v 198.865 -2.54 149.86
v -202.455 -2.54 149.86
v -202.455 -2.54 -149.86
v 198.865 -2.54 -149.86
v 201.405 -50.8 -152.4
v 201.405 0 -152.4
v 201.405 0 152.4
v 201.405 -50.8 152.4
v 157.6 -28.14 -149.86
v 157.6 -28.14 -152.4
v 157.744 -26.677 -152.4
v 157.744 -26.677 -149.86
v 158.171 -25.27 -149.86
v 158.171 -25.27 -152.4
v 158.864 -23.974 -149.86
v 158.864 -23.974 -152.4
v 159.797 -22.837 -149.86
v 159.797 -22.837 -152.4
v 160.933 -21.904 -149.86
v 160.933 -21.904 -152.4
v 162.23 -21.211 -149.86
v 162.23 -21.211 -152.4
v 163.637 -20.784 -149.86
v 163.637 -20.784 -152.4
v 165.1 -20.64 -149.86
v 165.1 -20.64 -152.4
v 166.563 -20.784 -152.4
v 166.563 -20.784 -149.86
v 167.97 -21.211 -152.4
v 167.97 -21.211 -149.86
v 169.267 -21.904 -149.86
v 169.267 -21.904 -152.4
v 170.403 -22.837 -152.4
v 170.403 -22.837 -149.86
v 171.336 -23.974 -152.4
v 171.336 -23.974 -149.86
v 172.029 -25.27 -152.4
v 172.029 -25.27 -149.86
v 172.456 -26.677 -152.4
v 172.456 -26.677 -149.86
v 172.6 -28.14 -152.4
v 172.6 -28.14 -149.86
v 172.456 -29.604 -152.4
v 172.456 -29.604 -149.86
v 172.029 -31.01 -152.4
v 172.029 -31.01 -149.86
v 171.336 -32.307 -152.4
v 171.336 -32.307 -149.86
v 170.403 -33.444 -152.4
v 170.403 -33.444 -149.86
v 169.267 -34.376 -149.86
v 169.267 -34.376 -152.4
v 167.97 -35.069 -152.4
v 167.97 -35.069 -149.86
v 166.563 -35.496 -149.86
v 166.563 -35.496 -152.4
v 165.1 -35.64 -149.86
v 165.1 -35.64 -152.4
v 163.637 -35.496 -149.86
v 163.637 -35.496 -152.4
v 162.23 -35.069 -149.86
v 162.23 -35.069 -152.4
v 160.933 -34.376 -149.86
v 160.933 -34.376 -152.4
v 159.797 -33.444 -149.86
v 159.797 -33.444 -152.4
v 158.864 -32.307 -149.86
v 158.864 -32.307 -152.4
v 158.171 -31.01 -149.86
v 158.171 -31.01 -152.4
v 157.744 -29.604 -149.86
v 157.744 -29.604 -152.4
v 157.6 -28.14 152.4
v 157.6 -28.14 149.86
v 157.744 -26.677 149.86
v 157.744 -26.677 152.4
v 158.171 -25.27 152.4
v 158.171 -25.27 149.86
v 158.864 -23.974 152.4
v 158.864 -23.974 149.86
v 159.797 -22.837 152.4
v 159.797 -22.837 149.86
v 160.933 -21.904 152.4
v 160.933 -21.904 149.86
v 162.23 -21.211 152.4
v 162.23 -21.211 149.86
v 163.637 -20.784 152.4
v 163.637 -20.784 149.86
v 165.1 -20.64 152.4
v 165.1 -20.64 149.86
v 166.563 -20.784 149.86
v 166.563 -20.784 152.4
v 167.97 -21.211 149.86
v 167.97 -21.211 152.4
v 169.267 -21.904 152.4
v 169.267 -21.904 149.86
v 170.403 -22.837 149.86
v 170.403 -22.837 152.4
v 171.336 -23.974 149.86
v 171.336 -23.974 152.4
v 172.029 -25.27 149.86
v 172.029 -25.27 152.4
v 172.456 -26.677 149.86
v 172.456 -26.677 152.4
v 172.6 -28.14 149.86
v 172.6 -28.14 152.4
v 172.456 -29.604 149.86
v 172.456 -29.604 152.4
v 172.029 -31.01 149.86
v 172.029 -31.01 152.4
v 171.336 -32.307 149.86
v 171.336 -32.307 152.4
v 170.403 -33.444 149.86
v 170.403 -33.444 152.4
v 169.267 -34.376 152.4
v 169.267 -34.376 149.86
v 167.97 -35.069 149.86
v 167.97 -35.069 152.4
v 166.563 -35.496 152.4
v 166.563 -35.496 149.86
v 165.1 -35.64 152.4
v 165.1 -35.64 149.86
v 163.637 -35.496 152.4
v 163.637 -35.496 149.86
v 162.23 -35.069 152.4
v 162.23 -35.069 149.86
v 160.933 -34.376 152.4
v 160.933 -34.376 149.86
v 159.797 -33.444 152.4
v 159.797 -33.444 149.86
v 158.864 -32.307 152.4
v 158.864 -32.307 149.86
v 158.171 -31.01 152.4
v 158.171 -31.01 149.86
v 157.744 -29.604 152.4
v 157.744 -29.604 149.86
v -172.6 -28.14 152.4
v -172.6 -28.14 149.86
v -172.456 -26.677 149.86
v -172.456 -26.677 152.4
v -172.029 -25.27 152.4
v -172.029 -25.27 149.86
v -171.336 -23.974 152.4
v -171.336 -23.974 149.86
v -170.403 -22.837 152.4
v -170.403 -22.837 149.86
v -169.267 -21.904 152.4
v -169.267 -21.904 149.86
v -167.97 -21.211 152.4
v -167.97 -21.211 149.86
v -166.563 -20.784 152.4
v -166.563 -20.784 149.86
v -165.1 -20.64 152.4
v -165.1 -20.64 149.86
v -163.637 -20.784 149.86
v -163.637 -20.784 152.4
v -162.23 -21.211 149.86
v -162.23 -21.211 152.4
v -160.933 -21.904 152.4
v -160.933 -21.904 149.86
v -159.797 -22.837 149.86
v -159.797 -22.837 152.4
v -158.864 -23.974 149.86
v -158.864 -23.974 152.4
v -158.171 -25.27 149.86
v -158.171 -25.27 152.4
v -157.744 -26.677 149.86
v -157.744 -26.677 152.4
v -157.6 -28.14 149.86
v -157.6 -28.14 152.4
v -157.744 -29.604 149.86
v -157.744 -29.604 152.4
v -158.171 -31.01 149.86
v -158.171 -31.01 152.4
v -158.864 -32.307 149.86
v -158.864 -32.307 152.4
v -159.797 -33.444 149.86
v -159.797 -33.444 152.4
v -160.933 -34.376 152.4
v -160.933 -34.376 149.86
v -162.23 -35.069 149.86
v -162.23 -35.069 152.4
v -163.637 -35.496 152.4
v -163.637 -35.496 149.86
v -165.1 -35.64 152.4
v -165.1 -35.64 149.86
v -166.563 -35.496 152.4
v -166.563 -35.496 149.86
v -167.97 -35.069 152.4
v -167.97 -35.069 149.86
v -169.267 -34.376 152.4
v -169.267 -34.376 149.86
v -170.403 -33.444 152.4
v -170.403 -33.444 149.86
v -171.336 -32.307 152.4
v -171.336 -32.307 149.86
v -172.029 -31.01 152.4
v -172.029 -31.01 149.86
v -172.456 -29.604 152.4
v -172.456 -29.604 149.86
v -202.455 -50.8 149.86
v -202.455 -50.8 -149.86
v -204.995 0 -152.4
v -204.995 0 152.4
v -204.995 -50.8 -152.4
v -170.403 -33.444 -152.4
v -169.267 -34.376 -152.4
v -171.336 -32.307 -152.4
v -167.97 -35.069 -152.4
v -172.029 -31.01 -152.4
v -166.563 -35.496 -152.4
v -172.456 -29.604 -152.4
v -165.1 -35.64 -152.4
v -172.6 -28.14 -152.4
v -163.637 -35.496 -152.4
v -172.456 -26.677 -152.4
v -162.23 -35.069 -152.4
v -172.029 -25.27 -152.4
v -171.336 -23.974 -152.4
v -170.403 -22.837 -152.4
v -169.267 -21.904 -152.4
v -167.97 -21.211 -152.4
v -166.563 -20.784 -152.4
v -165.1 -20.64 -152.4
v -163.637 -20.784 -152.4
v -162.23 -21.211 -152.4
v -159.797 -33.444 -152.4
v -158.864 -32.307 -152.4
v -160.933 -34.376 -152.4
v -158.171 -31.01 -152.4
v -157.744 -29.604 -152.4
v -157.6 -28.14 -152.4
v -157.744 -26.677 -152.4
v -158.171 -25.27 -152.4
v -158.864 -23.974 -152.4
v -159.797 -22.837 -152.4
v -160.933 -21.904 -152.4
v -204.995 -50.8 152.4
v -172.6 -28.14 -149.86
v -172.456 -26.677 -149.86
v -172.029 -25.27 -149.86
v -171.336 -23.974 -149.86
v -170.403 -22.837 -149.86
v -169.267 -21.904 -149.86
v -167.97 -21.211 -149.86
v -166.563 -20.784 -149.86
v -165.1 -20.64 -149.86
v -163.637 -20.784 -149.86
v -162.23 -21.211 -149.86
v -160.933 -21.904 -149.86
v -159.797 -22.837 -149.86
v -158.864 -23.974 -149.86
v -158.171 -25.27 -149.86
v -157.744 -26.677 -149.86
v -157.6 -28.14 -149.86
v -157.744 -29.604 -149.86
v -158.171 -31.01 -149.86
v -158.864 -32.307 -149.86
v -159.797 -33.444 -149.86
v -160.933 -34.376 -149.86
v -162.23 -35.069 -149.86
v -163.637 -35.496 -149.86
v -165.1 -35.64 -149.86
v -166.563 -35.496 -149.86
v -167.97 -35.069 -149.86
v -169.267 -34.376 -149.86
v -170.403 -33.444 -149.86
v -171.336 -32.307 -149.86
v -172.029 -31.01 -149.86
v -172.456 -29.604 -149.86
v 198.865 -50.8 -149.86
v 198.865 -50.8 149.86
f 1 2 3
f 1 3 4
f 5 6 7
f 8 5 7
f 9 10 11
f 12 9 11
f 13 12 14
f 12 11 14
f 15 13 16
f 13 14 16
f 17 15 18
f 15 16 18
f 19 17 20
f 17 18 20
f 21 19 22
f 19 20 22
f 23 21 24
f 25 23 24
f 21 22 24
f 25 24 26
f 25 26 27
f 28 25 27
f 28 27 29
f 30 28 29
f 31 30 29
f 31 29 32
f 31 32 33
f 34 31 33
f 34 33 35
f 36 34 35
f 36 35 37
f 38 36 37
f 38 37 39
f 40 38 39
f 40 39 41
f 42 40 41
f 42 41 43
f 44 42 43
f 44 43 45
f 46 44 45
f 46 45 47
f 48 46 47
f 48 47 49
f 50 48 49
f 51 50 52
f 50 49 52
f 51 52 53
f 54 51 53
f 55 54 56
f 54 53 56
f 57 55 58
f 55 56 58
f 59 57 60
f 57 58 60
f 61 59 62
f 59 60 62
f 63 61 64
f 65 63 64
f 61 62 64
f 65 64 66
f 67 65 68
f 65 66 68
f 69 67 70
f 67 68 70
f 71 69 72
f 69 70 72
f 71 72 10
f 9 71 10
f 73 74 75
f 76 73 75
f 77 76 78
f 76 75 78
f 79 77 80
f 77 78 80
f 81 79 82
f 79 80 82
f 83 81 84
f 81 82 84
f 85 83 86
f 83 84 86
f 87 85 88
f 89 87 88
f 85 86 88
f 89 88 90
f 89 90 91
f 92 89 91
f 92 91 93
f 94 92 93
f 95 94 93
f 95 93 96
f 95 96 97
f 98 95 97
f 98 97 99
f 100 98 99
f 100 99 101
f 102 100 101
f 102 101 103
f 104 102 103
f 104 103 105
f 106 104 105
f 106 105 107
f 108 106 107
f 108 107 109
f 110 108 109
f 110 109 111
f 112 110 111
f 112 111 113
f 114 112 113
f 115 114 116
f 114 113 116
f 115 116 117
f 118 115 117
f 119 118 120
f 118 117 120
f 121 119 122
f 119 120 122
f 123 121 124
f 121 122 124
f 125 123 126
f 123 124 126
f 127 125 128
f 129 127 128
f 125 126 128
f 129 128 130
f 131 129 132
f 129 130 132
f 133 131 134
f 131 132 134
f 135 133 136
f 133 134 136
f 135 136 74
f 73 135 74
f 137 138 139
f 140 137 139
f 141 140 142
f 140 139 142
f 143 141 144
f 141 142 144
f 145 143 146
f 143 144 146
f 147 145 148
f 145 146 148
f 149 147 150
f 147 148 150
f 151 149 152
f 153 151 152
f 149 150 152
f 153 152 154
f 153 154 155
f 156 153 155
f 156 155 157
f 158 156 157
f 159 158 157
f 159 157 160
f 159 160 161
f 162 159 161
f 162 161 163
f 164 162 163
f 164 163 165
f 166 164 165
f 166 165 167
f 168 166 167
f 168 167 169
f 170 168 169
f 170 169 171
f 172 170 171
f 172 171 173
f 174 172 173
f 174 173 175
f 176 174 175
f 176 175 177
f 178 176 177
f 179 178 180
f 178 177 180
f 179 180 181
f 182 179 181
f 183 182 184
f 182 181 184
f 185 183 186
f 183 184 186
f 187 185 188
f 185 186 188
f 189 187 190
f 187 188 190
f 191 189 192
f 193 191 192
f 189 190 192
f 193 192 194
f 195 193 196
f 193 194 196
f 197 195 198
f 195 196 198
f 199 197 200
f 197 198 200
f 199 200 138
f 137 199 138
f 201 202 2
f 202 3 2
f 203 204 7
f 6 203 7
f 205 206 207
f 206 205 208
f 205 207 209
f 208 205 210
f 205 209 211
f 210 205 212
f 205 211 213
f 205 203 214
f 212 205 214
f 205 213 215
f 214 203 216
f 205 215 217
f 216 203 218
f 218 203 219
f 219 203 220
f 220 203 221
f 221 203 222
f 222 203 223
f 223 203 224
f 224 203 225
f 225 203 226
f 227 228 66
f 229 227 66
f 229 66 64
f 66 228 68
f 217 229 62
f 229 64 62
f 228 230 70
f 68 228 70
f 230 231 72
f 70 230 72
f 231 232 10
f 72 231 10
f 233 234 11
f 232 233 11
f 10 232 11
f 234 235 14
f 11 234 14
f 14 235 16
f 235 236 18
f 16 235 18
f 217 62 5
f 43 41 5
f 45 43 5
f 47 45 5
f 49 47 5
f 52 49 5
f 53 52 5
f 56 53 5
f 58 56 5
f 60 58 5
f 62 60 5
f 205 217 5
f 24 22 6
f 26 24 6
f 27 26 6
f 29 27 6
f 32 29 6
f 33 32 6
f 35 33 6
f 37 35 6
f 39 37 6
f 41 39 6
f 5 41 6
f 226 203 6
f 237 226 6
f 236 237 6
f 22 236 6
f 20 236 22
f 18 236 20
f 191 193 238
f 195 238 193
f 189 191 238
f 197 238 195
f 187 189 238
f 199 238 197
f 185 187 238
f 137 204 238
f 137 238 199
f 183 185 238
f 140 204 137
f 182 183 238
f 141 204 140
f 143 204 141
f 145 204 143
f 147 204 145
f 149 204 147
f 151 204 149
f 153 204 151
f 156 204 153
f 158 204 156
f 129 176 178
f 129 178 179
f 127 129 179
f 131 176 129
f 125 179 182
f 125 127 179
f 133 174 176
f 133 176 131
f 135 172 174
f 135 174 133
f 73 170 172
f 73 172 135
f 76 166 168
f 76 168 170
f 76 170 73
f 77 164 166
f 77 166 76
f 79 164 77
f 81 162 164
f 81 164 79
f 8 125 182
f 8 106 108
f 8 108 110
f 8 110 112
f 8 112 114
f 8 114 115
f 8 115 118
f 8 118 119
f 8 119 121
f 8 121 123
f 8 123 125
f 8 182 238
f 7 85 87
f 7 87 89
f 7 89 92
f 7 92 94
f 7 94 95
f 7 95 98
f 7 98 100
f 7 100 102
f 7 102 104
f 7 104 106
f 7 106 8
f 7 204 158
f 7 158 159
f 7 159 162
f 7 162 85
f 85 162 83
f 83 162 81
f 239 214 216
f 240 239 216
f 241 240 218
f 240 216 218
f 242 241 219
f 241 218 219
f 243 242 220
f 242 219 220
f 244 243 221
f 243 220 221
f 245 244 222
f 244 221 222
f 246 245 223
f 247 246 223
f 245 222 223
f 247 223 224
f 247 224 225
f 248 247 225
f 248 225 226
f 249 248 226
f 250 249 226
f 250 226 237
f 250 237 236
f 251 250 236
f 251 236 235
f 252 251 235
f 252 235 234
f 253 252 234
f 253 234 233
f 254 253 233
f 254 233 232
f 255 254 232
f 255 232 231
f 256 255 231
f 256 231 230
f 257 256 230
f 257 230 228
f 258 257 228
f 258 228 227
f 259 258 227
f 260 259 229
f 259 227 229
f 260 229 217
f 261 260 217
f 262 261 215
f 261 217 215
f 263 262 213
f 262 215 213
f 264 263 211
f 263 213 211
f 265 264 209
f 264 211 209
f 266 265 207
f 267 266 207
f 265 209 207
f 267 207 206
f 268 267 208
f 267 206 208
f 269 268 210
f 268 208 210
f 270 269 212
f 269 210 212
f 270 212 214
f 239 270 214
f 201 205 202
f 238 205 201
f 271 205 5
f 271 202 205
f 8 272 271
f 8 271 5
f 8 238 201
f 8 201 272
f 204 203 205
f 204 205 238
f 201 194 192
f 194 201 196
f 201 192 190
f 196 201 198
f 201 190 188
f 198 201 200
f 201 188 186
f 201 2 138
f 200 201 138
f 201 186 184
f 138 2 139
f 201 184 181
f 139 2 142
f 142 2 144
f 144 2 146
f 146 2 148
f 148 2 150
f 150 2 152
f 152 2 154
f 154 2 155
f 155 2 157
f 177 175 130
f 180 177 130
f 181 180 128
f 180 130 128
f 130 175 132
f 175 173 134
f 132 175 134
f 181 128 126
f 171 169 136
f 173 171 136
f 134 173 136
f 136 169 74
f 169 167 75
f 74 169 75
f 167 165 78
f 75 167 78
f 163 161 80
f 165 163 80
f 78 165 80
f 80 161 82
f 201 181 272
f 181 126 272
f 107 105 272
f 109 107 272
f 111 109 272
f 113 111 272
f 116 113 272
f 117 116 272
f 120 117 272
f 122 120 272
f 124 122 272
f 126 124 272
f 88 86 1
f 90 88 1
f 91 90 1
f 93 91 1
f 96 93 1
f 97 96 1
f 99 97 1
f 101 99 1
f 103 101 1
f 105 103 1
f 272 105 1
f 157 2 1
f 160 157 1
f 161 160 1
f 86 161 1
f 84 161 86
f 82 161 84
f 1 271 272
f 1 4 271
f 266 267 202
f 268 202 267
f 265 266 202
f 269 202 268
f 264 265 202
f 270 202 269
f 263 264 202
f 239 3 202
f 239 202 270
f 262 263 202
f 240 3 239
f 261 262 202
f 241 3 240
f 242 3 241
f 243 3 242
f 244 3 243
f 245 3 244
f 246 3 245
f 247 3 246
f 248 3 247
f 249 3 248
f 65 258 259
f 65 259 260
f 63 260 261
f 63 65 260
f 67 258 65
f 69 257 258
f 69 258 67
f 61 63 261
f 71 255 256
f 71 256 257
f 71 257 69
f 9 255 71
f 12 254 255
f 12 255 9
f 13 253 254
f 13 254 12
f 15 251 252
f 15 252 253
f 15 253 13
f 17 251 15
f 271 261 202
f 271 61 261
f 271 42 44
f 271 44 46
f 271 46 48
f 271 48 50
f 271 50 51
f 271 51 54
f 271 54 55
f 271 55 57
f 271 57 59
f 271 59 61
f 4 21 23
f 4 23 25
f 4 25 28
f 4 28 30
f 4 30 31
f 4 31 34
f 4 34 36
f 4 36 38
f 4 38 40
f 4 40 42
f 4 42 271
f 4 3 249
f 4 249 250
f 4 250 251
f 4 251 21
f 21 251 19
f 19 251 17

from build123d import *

# Parameters (mm, degrees)
F0_W     = 406.4
F0_H     = 304.8
F1_DEPTH = 50.8
F2_T     = -2.54
F5_D     = 15


with BuildPart() as f1:
    # F0 (on Front) → F1 (new body)
    with BuildSketch(Plane.XZ):
        with Locations((-1.795288, 0)):
            Rectangle(F0_W, F0_H)
    extrude(amount=F1_DEPTH)

    # F2
    f2_openings = [f1.faces().sort_by_distance(p)[0] for p in [
        (-1.795288, -50.8, 0),
    ]]
    offset(amount=F2_T, openings=f2_openings)

    # F5 (through all)
    with Locations(Plane.XY.offset(152.4)):
        with Locations((-165.1, -28.140361), (165.1, -28.140361)):
            Hole(F5_D / 2)


solid = f1.part
